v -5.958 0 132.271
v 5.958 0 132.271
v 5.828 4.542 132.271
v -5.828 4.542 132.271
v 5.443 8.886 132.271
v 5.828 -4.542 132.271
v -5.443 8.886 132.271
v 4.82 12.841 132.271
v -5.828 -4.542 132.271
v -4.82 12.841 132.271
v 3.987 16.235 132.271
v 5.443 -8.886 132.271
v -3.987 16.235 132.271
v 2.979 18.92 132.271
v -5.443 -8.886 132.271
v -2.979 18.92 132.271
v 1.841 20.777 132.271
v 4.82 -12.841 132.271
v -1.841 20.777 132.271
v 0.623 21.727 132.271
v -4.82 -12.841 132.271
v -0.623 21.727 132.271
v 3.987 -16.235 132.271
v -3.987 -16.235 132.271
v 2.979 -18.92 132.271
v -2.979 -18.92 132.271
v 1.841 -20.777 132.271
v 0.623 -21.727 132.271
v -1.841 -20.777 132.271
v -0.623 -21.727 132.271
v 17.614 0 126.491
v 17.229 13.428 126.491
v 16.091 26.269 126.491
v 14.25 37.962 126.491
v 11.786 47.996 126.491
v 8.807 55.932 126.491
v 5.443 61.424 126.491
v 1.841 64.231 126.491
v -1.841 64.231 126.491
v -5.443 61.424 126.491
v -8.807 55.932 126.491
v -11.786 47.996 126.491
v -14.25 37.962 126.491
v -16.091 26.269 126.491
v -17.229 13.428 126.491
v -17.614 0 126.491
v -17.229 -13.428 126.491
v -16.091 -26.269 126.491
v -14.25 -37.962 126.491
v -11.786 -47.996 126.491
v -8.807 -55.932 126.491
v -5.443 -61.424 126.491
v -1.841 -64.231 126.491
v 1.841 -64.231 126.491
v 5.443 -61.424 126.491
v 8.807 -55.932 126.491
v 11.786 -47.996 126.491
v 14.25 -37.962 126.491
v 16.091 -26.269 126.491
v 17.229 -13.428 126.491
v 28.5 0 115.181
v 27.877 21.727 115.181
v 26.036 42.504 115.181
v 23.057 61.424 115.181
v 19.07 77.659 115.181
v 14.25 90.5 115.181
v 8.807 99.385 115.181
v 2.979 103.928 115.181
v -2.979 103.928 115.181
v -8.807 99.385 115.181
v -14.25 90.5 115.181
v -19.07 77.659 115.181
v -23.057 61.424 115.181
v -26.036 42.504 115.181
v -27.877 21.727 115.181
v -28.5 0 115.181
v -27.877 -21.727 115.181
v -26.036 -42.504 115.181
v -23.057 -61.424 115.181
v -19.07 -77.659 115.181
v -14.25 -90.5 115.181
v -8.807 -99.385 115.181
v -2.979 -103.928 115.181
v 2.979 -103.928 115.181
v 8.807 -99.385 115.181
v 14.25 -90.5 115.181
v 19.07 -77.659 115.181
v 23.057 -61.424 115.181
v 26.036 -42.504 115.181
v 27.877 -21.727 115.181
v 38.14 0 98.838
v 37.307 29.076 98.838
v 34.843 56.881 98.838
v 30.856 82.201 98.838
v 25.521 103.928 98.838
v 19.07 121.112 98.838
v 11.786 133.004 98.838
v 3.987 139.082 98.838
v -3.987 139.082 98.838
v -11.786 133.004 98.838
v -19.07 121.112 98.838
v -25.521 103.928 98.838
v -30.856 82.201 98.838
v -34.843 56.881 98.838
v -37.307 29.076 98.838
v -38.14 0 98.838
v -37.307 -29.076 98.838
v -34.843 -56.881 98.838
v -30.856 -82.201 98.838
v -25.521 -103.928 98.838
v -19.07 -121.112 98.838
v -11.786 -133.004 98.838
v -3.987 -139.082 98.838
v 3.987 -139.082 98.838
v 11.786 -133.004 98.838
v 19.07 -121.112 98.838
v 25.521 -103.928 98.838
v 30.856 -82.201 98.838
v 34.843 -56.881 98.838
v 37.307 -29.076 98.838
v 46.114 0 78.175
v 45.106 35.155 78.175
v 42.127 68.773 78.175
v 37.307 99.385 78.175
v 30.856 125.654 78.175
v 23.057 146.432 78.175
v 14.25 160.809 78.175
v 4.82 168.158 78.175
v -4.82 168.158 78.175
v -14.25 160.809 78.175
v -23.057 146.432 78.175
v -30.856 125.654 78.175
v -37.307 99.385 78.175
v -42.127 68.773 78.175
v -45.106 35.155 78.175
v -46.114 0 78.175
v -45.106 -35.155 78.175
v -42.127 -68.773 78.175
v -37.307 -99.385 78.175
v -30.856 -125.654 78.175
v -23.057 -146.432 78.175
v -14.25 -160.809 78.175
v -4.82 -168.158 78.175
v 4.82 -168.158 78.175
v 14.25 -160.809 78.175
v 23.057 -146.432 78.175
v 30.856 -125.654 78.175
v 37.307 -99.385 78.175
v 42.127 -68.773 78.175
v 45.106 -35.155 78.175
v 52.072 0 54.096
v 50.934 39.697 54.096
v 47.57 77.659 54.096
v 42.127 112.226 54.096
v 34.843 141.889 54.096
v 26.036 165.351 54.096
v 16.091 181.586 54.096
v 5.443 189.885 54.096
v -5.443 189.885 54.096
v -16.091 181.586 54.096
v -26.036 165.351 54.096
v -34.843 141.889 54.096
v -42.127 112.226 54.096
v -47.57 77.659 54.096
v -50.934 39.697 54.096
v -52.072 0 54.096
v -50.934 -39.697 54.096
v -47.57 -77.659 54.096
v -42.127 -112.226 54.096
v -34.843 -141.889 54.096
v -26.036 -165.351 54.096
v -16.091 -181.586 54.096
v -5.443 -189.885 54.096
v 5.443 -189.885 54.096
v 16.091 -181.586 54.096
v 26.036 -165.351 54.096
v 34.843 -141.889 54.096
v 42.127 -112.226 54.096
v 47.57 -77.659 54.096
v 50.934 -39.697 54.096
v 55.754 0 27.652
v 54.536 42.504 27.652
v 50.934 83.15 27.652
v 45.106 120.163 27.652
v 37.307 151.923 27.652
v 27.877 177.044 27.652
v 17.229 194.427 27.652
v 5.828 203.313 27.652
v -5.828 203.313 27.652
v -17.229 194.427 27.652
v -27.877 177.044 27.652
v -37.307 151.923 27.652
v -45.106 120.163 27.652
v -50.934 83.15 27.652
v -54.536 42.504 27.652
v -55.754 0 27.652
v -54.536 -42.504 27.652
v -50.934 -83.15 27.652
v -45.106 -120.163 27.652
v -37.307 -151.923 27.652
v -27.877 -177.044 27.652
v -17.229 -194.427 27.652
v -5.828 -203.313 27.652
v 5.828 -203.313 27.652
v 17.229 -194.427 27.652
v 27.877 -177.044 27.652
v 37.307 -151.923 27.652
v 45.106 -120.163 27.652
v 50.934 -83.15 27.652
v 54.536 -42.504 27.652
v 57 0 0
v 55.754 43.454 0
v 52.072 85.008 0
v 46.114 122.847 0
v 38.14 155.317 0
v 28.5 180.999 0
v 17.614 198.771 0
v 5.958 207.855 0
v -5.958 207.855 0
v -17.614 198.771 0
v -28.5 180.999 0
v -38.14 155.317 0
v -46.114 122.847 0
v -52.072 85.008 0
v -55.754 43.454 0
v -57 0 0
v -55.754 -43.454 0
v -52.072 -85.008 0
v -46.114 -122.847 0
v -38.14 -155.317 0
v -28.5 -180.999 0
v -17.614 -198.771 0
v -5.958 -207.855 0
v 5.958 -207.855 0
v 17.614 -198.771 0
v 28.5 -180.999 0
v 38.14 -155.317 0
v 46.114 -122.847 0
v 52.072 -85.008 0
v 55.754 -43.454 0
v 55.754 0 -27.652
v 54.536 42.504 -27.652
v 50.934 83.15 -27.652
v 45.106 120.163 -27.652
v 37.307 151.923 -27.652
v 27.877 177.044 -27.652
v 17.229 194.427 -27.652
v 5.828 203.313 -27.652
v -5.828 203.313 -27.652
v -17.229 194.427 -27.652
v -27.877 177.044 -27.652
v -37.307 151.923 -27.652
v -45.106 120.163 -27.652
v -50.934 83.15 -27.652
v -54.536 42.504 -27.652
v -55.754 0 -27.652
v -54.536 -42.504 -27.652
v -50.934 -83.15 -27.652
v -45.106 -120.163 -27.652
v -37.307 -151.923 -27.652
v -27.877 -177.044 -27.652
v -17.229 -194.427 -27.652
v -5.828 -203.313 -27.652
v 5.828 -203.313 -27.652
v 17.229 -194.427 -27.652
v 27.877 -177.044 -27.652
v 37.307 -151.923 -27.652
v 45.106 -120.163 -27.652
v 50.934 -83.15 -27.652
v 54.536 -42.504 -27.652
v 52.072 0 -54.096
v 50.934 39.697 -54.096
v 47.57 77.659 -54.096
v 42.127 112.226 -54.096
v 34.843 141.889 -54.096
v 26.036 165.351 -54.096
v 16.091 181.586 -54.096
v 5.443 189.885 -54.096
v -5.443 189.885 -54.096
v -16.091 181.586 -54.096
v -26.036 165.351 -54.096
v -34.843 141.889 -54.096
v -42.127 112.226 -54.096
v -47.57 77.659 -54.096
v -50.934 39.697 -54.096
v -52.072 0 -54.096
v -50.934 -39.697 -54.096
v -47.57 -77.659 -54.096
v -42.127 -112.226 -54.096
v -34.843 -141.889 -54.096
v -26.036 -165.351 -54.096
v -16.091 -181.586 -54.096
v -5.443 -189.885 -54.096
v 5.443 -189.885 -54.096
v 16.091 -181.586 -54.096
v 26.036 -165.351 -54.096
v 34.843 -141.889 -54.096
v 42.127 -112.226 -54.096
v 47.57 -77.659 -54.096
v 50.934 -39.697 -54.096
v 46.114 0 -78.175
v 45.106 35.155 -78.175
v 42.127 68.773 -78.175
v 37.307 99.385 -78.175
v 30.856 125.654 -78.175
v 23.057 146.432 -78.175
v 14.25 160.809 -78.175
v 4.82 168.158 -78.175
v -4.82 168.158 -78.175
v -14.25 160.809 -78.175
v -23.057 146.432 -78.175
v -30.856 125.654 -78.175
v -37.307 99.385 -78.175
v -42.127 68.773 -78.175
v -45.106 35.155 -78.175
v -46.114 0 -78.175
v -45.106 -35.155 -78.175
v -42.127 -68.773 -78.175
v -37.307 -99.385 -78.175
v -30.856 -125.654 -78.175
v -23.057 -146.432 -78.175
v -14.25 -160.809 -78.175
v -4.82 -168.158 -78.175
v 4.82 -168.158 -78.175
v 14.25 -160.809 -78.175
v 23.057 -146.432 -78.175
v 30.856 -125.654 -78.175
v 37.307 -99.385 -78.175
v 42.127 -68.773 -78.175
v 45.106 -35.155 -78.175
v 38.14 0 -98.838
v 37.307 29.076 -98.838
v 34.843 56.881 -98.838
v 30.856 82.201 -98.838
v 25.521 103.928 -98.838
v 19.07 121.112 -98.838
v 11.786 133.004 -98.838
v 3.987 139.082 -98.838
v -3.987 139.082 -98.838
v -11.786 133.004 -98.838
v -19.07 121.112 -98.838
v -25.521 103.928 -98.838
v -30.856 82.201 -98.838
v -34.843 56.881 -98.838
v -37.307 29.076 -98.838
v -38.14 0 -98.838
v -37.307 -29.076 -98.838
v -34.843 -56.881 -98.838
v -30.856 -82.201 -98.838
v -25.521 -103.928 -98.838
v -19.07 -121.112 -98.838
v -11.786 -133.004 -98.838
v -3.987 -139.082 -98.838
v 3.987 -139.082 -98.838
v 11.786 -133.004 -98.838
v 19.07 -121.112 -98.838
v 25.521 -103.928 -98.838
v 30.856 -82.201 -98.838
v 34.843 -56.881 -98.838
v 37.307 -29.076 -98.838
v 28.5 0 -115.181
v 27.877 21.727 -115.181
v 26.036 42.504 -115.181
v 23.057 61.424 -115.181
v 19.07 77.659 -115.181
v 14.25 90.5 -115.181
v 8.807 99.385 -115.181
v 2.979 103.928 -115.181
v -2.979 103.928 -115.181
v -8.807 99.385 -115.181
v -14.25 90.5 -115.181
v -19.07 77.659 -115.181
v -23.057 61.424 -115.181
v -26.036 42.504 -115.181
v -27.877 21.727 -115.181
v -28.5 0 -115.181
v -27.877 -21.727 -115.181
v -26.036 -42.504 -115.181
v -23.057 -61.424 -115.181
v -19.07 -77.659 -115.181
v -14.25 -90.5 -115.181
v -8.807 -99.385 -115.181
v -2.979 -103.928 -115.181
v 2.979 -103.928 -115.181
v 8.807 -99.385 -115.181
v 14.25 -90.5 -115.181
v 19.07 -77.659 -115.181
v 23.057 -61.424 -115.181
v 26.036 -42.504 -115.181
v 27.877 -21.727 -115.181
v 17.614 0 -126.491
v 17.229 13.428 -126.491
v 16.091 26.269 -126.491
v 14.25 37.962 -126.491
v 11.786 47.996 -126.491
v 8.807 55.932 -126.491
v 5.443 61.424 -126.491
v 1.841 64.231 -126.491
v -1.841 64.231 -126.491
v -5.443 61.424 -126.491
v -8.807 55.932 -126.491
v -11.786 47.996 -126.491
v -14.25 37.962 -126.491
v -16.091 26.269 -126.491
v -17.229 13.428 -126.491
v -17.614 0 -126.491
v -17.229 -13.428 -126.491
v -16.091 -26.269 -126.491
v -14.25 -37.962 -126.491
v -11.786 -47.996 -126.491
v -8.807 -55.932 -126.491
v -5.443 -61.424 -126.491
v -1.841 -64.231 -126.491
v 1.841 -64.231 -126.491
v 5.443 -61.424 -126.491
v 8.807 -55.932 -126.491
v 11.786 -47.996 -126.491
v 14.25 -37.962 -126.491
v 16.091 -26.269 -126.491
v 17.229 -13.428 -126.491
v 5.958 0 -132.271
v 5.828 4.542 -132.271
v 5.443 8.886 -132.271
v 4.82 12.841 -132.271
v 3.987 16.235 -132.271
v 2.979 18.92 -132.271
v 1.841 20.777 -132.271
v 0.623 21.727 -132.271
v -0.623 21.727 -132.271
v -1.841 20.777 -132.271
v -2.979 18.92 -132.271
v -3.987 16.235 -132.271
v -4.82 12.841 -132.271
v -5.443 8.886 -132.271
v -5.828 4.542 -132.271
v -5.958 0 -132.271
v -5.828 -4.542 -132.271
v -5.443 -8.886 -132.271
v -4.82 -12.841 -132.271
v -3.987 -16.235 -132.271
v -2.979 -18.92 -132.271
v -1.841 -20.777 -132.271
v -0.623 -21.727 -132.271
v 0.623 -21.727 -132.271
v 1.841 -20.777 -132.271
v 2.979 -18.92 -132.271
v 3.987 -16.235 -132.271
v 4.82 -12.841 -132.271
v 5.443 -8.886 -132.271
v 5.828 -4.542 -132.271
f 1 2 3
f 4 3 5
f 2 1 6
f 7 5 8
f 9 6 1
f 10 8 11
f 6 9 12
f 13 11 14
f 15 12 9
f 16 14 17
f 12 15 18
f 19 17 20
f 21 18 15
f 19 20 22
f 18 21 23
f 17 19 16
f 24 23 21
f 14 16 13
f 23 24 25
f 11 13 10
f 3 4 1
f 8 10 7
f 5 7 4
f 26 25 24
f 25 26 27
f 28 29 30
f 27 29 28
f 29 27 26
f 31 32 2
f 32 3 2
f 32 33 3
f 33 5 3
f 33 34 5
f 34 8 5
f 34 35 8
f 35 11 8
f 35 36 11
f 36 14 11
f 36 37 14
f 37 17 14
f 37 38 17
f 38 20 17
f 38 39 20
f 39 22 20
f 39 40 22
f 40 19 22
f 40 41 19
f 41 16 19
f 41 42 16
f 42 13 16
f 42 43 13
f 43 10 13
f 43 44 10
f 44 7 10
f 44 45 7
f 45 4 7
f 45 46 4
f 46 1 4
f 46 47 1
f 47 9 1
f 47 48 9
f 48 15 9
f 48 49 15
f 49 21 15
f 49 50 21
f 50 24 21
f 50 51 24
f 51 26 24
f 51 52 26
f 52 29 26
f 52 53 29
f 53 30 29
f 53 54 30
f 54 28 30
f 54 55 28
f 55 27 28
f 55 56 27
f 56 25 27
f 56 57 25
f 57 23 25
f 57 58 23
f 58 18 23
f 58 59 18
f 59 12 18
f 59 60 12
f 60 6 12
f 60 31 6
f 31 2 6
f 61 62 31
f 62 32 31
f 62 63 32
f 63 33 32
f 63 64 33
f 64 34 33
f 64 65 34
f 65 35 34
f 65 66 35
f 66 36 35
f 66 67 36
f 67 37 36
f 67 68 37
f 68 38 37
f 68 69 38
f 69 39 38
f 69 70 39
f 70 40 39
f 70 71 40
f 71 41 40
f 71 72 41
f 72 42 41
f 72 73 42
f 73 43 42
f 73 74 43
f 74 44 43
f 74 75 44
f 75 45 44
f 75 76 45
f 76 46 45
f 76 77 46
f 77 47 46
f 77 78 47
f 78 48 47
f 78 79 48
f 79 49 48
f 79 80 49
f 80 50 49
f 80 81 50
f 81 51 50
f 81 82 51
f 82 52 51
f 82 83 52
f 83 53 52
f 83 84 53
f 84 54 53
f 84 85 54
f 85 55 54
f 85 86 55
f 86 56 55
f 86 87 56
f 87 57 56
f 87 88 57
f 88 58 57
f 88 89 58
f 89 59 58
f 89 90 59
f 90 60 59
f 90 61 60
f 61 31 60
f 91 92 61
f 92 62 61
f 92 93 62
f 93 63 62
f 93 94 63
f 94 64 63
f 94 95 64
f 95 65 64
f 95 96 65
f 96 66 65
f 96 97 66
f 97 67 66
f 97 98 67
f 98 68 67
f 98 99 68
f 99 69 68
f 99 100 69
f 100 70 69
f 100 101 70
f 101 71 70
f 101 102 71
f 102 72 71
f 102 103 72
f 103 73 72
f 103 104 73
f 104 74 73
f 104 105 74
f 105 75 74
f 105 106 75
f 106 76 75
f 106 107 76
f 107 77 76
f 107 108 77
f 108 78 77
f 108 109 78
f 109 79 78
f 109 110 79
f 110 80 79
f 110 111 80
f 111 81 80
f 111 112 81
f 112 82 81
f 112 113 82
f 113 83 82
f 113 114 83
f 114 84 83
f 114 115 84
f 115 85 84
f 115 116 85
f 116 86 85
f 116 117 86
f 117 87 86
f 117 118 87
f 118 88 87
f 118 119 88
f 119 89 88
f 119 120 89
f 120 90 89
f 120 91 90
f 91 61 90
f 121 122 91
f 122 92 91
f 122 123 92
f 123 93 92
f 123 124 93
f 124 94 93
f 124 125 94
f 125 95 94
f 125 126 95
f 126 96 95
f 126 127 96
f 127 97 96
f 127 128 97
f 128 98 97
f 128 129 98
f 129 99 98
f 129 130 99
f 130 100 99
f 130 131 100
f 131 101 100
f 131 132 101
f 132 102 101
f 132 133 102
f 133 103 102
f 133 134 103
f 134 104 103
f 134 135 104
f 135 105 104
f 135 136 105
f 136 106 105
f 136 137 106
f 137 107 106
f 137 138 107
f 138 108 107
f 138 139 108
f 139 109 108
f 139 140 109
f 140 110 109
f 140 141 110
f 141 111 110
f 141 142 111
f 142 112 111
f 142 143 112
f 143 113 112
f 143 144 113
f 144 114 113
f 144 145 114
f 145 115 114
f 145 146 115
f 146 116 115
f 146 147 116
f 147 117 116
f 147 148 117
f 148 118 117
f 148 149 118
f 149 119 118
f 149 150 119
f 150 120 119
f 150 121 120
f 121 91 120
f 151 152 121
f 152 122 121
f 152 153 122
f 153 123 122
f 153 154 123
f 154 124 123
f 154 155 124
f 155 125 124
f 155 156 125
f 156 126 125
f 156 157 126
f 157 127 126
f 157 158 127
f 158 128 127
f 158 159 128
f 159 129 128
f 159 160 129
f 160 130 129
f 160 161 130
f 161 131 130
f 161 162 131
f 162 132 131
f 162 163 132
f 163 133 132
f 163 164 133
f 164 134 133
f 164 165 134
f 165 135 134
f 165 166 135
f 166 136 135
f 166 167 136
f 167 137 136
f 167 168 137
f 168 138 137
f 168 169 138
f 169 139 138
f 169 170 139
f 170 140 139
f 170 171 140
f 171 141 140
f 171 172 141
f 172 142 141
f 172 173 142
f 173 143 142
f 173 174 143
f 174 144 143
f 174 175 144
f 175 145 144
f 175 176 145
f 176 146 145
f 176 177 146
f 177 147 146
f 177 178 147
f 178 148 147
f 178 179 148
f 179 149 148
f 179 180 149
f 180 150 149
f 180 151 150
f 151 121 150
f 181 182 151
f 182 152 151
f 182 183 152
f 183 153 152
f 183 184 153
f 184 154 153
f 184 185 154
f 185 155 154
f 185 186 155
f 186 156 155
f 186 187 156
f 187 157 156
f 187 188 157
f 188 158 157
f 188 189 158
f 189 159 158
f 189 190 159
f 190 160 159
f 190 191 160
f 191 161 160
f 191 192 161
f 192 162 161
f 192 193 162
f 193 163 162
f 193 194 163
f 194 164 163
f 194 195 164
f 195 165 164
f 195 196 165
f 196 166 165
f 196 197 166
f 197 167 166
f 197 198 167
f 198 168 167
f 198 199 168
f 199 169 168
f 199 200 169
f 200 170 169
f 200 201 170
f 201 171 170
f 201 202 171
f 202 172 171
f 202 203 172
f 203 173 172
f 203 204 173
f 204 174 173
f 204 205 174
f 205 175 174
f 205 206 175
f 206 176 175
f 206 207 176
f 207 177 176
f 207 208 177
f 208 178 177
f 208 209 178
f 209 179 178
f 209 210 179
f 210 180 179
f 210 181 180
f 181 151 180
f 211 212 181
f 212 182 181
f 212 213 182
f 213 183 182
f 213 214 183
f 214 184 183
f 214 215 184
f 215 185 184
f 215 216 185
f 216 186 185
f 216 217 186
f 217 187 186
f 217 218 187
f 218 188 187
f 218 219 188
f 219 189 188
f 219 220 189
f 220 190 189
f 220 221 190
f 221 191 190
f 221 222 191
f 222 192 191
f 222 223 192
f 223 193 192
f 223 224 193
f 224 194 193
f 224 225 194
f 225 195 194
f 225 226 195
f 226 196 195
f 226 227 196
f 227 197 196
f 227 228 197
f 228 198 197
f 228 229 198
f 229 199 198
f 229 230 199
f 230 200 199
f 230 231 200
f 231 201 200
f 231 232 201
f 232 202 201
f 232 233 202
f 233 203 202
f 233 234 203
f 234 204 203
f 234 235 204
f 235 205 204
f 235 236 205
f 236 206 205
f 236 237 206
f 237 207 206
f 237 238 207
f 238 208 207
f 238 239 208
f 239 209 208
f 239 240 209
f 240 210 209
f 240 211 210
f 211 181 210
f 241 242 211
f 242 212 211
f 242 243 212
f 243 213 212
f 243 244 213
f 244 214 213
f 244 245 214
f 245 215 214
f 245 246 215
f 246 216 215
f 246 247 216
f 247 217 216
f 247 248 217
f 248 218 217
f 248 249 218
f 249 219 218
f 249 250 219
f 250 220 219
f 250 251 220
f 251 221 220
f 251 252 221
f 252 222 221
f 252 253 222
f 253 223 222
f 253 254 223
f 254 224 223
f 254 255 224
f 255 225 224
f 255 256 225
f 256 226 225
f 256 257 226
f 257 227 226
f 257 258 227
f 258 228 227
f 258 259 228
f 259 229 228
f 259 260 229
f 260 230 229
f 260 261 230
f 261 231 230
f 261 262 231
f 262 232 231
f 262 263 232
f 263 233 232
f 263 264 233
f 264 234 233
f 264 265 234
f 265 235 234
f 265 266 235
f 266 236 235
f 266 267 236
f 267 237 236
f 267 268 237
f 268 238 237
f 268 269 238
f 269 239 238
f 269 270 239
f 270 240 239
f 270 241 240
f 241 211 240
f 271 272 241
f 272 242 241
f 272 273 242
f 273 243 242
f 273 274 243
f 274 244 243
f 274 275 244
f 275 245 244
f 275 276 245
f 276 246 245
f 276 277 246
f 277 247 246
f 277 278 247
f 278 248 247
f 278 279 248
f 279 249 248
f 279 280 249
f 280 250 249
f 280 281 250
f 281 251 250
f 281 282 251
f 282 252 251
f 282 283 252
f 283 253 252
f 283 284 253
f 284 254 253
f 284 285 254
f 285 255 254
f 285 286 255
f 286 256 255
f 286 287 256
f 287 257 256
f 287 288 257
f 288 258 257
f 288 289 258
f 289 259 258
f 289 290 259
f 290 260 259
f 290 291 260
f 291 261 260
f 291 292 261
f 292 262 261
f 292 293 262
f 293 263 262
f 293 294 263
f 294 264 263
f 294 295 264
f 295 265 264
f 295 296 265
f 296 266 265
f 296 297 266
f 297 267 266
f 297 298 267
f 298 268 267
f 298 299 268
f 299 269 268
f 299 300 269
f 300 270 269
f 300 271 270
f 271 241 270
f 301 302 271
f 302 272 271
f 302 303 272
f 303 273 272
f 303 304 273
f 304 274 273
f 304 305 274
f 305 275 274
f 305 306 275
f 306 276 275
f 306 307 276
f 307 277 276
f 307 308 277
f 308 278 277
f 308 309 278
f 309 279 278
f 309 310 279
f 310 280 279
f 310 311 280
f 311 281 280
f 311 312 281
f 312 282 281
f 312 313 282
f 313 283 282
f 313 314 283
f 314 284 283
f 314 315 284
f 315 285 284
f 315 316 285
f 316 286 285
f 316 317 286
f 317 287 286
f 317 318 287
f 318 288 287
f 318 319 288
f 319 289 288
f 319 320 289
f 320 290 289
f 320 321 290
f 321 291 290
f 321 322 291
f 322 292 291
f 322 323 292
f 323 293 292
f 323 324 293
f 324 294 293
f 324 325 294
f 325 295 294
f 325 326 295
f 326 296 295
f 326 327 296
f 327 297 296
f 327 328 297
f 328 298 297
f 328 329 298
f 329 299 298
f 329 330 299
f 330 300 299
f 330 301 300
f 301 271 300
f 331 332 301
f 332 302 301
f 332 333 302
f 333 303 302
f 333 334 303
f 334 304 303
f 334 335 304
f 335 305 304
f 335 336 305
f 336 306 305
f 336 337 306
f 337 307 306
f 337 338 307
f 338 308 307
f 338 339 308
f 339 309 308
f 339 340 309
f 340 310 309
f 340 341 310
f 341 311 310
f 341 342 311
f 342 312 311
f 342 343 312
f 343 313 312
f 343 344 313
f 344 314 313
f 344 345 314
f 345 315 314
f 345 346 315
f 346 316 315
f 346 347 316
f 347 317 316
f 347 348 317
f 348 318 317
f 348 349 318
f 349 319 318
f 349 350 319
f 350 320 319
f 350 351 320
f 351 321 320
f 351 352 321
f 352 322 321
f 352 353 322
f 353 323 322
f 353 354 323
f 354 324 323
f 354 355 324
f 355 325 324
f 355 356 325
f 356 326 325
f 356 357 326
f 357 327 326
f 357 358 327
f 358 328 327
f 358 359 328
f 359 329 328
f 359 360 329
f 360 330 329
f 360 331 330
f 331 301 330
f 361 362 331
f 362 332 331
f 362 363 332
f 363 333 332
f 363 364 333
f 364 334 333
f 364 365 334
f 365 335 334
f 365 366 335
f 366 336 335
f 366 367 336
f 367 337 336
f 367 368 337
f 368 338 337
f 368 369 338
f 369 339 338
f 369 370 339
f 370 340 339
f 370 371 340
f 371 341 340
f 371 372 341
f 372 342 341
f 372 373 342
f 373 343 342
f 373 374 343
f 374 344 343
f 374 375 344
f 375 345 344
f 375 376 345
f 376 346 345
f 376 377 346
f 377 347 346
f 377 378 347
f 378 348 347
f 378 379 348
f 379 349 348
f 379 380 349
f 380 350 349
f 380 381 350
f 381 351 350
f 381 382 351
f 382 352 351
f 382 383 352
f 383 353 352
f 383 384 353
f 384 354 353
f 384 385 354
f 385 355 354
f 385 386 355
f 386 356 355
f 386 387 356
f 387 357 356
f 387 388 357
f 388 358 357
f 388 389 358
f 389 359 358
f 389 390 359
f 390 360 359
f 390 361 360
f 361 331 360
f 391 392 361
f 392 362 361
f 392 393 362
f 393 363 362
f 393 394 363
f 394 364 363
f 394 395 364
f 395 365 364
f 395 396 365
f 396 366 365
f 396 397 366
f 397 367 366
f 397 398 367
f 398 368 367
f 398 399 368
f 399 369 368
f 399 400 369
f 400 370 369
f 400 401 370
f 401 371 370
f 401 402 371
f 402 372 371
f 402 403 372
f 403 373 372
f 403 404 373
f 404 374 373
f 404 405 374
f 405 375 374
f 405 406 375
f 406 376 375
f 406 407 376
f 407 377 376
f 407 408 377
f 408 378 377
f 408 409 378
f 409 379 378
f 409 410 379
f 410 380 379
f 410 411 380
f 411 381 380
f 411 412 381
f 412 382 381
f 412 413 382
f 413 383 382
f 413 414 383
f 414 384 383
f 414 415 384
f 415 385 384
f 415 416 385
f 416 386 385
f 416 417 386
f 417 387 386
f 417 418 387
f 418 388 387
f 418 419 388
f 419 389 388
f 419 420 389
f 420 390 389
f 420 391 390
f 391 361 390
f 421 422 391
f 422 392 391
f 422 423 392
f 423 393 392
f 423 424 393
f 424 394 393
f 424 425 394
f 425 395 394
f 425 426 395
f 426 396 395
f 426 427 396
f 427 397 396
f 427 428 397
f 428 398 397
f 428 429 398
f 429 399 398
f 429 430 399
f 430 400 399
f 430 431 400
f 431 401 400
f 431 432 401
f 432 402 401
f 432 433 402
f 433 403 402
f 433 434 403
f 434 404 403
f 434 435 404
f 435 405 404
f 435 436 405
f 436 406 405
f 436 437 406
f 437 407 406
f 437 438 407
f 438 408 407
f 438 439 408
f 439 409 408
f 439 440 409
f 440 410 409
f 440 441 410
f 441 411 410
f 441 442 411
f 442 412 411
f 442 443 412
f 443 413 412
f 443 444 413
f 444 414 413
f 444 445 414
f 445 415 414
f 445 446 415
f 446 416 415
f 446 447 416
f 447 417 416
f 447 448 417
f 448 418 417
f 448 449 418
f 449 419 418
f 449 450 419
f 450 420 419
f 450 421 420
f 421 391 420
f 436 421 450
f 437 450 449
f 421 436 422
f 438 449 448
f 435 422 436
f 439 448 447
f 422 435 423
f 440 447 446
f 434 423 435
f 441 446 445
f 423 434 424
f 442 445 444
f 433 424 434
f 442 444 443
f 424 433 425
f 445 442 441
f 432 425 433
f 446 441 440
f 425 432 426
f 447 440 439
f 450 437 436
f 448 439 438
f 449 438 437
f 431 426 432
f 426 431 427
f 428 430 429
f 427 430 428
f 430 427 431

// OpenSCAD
// Generated by SolidPython 1.0.1 on 2020-07-29 00:46:45


scale(v = [3, 11, 7]) {
	sphere(r = 19);
}
/***********************************************
*********      SolidPython code:      **********
************************************************
 
# import packages: SolidPython
from solid import *
from solid.utils import *
from itertools import chain, combinations, permutations


class Resize:

    def __init__(self, scad_file):
        self.scad_file = scad_file
        #self.scad_file = import_scad(scad_file)
        # cone/cylinder param:
        self.r1 = 0
        self.r2 = 0
        self.h = 0
        # rectangular prism param:
        self.w = 0
        self.l = 0
        # ellipse param:
        self.r = 0

    # import OpenScad code (file name corresponds to shape)


    # classify shape + parameters
    def assign(self, param1, param2, param3):
        if self.scad_file == 'cone.scad':
            self.r1 = param1
            self.r2 = param2
            self.h = param3
        elif self.scad_file == 'cylinder.scad':
            self.r1 = param1
            self.r2 = param2
            self.h = param3
        elif self.scad_file == 'rectangularPrism.scad':
            self.h = param1
            self.l = param2
            self.w = param3
        else:
            self.r = param1
            self.h = param2

    # resize parameters
    def iterate(self):
        x = range(3, 20, 2)
        i = 1
        if self.scad_file == 'cone.scad':
            tempList = list(permutations(x, 2))
            for temp in tempList:
                param1 = temp[0]
                param2 = temp[1]
                filepath = 'produced_scad_files/' + 'cone' + str(param1) + '_' + str(param2) + '_' + '.scad'
                scad_render_to_file(cylinder(h=param1, r1=param2, r2=0), filepath)

        elif self.scad_file == 'cylinder.scad':
            tempList = list(permutations(x, 3))
            for temp in tempList:
                param1 = temp[0]
                param2 = temp[1]
                filepath = 'produced_scad_files/' + 'cylinder' + str(param1) + '_' + str(param2) + '_' + '.scad'
                scad_render_to_file(cylinder(h=param1, r1=param2, r2=param2), filepath)

        elif self.scad_file == 'rectangularPrism.scad':
            tempList = list(permutations(x, 3))
            for temp in tempList:
                param1 = temp[0]
                param2 = temp[1]
                param3 = temp[2]
                filepath = 'produced_scad_files/' + 'rectangularPrism' + str(param1) + '_' + str(param2) + '_' + str(
                    param3) + '.scad'
                scad_render_to_file(cube(size=(param1, param2, param3)), filepath)

        elif self.scad_file == 'ellipse.scad':
            tempList = list(permutations(x, 4))
            for temp in tempList:
                param1 = temp[0]
                param2 = temp[1]
                param3 = temp[2]
                param4 = temp[3]
                filepath = 'produced_scad_files/' + 'ellipse' + str(param1) + '_' + str(param2) + '_' + str(param3) + '_' + str(param4) + '.scad'
                scad_render_to_file(scale([param1, param2, param3])(sphere(r=param4)), filepath)

    def render_to_scadfile(self):
        scad_render_to_file(scad, 'example.scad') 
 
************************************************/
